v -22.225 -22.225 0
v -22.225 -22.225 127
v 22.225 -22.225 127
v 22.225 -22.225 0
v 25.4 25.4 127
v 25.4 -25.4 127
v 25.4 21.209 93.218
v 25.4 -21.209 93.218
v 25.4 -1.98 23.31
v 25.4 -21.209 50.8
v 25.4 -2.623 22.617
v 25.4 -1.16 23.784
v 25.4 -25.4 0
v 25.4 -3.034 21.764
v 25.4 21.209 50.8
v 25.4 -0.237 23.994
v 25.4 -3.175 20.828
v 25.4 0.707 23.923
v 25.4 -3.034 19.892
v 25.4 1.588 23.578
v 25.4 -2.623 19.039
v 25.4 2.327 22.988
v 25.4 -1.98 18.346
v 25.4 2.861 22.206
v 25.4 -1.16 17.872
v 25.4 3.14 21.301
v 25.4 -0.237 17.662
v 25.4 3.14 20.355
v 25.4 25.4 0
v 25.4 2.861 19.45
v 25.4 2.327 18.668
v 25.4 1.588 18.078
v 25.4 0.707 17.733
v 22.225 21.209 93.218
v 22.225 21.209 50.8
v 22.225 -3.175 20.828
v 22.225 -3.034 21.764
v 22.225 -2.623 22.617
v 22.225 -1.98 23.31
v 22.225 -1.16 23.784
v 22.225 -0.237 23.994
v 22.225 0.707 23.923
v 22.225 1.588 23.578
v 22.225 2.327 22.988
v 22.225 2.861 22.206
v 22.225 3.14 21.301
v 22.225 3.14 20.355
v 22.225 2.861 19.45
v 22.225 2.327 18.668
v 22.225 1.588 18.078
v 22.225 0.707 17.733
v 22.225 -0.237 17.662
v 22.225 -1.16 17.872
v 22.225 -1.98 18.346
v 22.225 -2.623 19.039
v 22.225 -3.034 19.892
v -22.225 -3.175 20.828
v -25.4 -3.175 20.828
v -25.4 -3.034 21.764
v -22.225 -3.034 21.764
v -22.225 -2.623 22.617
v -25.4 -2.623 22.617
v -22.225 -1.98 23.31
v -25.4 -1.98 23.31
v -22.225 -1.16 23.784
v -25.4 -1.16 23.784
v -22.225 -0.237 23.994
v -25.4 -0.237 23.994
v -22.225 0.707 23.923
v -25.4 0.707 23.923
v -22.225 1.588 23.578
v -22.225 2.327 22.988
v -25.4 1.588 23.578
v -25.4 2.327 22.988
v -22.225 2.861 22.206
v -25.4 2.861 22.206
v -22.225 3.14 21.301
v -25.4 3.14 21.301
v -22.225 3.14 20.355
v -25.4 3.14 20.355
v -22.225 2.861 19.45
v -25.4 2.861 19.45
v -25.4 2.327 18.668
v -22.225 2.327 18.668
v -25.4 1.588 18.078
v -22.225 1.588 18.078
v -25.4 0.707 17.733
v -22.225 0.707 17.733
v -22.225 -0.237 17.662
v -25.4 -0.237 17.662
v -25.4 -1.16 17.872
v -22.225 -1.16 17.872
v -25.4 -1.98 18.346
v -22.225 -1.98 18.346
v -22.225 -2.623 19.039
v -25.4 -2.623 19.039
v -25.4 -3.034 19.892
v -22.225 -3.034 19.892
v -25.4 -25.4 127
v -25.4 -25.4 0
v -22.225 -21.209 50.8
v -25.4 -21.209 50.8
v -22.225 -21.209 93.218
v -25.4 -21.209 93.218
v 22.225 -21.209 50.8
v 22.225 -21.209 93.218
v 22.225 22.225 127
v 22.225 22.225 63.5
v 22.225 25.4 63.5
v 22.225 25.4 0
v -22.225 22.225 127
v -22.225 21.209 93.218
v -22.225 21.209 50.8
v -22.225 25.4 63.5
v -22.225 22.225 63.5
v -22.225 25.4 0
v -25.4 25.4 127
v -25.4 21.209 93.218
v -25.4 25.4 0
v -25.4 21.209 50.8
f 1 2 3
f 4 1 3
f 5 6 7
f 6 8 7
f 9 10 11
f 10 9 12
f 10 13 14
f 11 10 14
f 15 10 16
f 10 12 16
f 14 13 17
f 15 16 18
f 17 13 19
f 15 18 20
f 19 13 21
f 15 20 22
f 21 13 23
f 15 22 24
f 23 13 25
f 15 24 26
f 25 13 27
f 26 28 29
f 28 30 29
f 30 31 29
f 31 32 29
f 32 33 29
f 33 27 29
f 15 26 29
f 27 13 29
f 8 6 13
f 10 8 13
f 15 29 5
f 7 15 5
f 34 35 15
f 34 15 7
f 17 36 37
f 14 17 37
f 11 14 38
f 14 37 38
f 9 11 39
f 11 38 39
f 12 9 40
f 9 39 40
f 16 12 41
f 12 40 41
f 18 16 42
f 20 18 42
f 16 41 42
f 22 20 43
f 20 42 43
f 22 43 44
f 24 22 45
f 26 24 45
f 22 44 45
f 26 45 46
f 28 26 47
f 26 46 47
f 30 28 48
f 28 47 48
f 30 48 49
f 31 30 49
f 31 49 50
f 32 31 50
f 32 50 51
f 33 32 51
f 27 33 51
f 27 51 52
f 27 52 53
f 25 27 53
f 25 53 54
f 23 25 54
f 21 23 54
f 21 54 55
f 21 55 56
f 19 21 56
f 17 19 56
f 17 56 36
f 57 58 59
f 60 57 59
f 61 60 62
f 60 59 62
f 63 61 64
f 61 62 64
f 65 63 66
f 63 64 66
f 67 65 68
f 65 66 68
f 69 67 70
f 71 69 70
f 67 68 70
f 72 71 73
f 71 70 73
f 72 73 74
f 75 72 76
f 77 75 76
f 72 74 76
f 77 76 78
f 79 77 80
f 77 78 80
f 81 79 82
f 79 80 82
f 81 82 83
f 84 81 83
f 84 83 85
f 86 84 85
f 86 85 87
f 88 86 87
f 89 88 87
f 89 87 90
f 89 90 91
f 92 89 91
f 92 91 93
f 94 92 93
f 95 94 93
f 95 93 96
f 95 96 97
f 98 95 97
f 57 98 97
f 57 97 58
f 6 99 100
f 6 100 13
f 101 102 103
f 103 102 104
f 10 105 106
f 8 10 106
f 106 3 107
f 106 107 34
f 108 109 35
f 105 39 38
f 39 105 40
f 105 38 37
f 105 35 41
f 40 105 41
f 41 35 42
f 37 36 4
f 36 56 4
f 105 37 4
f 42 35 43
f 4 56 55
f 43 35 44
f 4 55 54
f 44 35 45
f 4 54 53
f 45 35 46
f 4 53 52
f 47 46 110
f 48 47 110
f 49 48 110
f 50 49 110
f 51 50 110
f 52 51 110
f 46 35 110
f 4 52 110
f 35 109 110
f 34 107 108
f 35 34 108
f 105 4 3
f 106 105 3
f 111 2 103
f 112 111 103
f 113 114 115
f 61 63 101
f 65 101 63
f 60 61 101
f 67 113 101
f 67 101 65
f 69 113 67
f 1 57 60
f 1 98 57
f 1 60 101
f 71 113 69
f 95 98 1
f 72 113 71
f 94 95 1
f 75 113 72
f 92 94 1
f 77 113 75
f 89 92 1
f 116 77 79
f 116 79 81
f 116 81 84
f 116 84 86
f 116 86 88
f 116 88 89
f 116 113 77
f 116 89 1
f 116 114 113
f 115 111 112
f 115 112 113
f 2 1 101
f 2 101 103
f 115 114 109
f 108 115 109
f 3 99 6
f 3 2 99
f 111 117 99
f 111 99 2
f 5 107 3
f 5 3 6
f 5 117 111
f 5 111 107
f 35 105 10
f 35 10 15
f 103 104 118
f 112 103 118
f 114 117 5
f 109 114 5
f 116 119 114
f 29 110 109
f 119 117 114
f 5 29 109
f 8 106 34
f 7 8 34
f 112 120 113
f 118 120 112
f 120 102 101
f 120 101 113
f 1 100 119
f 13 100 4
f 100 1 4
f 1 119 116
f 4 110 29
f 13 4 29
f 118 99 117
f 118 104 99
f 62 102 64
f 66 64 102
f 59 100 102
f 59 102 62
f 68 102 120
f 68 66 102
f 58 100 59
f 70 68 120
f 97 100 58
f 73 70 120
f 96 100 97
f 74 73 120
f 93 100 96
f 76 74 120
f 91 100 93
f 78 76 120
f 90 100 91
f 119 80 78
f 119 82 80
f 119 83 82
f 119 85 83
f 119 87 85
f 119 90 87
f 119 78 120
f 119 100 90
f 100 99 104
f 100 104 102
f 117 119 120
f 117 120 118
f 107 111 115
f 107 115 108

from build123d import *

# Parameters (mm, degrees)
SKETCH2_W           = 50.8
SKETCH2_H           = 50.8
SKETCH2_W_2         = 44.45
SKETCH2_H_2         = 44.45
BOSS_EXTRUDE1_DEPTH = 127
SKETCH4_W           = 44.45
SKETCH4_H           = 63.5
CUT_EXTRUDE1_DEPTH  = 23.368
SKETCH5_R           = 3.175
SKETCH5_W           = 42.418
SKETCH5_H           = 42.418
CUT_EXTRUDE2_DEPTH  = 100.130759523


with BuildPart() as part:
    # Sketch2 → Boss-Extrude1 (new body)
    with BuildSketch(Plane.XY):
        Rectangle(SKETCH2_W, SKETCH2_H)
        Rectangle(SKETCH2_W_2, SKETCH2_H_2, mode=Mode.SUBTRACT)
    extrude(amount=BOSS_EXTRUDE1_DEPTH)

    # Sketch4 → Cut-Extrude1 (cut)
    with BuildSketch(Plane(origin=(0, 25.4, 0), x_dir=(1, 0, 0), z_dir=(0, 1, 0))):
        with Locations((0, -31.75)):
            Rectangle(SKETCH4_W, SKETCH4_H)
    extrude(amount=-CUT_EXTRUDE1_DEPTH, mode=Mode.SUBTRACT)

    # Sketch5 → Cut-Extrude2 (cut)
    with BuildSketch(Plane.ZY.offset(25.4)):
        with Locations(Location((20.828, 0, 0), (0, 0, 270))):
            Circle(SKETCH5_R)
        with Locations((72.009, 0)):
            Rectangle(SKETCH5_W, SKETCH5_H)
    extrude(amount=-CUT_EXTRUDE2_DEPTH, mode=Mode.SUBTRACT)


solid = part.part
